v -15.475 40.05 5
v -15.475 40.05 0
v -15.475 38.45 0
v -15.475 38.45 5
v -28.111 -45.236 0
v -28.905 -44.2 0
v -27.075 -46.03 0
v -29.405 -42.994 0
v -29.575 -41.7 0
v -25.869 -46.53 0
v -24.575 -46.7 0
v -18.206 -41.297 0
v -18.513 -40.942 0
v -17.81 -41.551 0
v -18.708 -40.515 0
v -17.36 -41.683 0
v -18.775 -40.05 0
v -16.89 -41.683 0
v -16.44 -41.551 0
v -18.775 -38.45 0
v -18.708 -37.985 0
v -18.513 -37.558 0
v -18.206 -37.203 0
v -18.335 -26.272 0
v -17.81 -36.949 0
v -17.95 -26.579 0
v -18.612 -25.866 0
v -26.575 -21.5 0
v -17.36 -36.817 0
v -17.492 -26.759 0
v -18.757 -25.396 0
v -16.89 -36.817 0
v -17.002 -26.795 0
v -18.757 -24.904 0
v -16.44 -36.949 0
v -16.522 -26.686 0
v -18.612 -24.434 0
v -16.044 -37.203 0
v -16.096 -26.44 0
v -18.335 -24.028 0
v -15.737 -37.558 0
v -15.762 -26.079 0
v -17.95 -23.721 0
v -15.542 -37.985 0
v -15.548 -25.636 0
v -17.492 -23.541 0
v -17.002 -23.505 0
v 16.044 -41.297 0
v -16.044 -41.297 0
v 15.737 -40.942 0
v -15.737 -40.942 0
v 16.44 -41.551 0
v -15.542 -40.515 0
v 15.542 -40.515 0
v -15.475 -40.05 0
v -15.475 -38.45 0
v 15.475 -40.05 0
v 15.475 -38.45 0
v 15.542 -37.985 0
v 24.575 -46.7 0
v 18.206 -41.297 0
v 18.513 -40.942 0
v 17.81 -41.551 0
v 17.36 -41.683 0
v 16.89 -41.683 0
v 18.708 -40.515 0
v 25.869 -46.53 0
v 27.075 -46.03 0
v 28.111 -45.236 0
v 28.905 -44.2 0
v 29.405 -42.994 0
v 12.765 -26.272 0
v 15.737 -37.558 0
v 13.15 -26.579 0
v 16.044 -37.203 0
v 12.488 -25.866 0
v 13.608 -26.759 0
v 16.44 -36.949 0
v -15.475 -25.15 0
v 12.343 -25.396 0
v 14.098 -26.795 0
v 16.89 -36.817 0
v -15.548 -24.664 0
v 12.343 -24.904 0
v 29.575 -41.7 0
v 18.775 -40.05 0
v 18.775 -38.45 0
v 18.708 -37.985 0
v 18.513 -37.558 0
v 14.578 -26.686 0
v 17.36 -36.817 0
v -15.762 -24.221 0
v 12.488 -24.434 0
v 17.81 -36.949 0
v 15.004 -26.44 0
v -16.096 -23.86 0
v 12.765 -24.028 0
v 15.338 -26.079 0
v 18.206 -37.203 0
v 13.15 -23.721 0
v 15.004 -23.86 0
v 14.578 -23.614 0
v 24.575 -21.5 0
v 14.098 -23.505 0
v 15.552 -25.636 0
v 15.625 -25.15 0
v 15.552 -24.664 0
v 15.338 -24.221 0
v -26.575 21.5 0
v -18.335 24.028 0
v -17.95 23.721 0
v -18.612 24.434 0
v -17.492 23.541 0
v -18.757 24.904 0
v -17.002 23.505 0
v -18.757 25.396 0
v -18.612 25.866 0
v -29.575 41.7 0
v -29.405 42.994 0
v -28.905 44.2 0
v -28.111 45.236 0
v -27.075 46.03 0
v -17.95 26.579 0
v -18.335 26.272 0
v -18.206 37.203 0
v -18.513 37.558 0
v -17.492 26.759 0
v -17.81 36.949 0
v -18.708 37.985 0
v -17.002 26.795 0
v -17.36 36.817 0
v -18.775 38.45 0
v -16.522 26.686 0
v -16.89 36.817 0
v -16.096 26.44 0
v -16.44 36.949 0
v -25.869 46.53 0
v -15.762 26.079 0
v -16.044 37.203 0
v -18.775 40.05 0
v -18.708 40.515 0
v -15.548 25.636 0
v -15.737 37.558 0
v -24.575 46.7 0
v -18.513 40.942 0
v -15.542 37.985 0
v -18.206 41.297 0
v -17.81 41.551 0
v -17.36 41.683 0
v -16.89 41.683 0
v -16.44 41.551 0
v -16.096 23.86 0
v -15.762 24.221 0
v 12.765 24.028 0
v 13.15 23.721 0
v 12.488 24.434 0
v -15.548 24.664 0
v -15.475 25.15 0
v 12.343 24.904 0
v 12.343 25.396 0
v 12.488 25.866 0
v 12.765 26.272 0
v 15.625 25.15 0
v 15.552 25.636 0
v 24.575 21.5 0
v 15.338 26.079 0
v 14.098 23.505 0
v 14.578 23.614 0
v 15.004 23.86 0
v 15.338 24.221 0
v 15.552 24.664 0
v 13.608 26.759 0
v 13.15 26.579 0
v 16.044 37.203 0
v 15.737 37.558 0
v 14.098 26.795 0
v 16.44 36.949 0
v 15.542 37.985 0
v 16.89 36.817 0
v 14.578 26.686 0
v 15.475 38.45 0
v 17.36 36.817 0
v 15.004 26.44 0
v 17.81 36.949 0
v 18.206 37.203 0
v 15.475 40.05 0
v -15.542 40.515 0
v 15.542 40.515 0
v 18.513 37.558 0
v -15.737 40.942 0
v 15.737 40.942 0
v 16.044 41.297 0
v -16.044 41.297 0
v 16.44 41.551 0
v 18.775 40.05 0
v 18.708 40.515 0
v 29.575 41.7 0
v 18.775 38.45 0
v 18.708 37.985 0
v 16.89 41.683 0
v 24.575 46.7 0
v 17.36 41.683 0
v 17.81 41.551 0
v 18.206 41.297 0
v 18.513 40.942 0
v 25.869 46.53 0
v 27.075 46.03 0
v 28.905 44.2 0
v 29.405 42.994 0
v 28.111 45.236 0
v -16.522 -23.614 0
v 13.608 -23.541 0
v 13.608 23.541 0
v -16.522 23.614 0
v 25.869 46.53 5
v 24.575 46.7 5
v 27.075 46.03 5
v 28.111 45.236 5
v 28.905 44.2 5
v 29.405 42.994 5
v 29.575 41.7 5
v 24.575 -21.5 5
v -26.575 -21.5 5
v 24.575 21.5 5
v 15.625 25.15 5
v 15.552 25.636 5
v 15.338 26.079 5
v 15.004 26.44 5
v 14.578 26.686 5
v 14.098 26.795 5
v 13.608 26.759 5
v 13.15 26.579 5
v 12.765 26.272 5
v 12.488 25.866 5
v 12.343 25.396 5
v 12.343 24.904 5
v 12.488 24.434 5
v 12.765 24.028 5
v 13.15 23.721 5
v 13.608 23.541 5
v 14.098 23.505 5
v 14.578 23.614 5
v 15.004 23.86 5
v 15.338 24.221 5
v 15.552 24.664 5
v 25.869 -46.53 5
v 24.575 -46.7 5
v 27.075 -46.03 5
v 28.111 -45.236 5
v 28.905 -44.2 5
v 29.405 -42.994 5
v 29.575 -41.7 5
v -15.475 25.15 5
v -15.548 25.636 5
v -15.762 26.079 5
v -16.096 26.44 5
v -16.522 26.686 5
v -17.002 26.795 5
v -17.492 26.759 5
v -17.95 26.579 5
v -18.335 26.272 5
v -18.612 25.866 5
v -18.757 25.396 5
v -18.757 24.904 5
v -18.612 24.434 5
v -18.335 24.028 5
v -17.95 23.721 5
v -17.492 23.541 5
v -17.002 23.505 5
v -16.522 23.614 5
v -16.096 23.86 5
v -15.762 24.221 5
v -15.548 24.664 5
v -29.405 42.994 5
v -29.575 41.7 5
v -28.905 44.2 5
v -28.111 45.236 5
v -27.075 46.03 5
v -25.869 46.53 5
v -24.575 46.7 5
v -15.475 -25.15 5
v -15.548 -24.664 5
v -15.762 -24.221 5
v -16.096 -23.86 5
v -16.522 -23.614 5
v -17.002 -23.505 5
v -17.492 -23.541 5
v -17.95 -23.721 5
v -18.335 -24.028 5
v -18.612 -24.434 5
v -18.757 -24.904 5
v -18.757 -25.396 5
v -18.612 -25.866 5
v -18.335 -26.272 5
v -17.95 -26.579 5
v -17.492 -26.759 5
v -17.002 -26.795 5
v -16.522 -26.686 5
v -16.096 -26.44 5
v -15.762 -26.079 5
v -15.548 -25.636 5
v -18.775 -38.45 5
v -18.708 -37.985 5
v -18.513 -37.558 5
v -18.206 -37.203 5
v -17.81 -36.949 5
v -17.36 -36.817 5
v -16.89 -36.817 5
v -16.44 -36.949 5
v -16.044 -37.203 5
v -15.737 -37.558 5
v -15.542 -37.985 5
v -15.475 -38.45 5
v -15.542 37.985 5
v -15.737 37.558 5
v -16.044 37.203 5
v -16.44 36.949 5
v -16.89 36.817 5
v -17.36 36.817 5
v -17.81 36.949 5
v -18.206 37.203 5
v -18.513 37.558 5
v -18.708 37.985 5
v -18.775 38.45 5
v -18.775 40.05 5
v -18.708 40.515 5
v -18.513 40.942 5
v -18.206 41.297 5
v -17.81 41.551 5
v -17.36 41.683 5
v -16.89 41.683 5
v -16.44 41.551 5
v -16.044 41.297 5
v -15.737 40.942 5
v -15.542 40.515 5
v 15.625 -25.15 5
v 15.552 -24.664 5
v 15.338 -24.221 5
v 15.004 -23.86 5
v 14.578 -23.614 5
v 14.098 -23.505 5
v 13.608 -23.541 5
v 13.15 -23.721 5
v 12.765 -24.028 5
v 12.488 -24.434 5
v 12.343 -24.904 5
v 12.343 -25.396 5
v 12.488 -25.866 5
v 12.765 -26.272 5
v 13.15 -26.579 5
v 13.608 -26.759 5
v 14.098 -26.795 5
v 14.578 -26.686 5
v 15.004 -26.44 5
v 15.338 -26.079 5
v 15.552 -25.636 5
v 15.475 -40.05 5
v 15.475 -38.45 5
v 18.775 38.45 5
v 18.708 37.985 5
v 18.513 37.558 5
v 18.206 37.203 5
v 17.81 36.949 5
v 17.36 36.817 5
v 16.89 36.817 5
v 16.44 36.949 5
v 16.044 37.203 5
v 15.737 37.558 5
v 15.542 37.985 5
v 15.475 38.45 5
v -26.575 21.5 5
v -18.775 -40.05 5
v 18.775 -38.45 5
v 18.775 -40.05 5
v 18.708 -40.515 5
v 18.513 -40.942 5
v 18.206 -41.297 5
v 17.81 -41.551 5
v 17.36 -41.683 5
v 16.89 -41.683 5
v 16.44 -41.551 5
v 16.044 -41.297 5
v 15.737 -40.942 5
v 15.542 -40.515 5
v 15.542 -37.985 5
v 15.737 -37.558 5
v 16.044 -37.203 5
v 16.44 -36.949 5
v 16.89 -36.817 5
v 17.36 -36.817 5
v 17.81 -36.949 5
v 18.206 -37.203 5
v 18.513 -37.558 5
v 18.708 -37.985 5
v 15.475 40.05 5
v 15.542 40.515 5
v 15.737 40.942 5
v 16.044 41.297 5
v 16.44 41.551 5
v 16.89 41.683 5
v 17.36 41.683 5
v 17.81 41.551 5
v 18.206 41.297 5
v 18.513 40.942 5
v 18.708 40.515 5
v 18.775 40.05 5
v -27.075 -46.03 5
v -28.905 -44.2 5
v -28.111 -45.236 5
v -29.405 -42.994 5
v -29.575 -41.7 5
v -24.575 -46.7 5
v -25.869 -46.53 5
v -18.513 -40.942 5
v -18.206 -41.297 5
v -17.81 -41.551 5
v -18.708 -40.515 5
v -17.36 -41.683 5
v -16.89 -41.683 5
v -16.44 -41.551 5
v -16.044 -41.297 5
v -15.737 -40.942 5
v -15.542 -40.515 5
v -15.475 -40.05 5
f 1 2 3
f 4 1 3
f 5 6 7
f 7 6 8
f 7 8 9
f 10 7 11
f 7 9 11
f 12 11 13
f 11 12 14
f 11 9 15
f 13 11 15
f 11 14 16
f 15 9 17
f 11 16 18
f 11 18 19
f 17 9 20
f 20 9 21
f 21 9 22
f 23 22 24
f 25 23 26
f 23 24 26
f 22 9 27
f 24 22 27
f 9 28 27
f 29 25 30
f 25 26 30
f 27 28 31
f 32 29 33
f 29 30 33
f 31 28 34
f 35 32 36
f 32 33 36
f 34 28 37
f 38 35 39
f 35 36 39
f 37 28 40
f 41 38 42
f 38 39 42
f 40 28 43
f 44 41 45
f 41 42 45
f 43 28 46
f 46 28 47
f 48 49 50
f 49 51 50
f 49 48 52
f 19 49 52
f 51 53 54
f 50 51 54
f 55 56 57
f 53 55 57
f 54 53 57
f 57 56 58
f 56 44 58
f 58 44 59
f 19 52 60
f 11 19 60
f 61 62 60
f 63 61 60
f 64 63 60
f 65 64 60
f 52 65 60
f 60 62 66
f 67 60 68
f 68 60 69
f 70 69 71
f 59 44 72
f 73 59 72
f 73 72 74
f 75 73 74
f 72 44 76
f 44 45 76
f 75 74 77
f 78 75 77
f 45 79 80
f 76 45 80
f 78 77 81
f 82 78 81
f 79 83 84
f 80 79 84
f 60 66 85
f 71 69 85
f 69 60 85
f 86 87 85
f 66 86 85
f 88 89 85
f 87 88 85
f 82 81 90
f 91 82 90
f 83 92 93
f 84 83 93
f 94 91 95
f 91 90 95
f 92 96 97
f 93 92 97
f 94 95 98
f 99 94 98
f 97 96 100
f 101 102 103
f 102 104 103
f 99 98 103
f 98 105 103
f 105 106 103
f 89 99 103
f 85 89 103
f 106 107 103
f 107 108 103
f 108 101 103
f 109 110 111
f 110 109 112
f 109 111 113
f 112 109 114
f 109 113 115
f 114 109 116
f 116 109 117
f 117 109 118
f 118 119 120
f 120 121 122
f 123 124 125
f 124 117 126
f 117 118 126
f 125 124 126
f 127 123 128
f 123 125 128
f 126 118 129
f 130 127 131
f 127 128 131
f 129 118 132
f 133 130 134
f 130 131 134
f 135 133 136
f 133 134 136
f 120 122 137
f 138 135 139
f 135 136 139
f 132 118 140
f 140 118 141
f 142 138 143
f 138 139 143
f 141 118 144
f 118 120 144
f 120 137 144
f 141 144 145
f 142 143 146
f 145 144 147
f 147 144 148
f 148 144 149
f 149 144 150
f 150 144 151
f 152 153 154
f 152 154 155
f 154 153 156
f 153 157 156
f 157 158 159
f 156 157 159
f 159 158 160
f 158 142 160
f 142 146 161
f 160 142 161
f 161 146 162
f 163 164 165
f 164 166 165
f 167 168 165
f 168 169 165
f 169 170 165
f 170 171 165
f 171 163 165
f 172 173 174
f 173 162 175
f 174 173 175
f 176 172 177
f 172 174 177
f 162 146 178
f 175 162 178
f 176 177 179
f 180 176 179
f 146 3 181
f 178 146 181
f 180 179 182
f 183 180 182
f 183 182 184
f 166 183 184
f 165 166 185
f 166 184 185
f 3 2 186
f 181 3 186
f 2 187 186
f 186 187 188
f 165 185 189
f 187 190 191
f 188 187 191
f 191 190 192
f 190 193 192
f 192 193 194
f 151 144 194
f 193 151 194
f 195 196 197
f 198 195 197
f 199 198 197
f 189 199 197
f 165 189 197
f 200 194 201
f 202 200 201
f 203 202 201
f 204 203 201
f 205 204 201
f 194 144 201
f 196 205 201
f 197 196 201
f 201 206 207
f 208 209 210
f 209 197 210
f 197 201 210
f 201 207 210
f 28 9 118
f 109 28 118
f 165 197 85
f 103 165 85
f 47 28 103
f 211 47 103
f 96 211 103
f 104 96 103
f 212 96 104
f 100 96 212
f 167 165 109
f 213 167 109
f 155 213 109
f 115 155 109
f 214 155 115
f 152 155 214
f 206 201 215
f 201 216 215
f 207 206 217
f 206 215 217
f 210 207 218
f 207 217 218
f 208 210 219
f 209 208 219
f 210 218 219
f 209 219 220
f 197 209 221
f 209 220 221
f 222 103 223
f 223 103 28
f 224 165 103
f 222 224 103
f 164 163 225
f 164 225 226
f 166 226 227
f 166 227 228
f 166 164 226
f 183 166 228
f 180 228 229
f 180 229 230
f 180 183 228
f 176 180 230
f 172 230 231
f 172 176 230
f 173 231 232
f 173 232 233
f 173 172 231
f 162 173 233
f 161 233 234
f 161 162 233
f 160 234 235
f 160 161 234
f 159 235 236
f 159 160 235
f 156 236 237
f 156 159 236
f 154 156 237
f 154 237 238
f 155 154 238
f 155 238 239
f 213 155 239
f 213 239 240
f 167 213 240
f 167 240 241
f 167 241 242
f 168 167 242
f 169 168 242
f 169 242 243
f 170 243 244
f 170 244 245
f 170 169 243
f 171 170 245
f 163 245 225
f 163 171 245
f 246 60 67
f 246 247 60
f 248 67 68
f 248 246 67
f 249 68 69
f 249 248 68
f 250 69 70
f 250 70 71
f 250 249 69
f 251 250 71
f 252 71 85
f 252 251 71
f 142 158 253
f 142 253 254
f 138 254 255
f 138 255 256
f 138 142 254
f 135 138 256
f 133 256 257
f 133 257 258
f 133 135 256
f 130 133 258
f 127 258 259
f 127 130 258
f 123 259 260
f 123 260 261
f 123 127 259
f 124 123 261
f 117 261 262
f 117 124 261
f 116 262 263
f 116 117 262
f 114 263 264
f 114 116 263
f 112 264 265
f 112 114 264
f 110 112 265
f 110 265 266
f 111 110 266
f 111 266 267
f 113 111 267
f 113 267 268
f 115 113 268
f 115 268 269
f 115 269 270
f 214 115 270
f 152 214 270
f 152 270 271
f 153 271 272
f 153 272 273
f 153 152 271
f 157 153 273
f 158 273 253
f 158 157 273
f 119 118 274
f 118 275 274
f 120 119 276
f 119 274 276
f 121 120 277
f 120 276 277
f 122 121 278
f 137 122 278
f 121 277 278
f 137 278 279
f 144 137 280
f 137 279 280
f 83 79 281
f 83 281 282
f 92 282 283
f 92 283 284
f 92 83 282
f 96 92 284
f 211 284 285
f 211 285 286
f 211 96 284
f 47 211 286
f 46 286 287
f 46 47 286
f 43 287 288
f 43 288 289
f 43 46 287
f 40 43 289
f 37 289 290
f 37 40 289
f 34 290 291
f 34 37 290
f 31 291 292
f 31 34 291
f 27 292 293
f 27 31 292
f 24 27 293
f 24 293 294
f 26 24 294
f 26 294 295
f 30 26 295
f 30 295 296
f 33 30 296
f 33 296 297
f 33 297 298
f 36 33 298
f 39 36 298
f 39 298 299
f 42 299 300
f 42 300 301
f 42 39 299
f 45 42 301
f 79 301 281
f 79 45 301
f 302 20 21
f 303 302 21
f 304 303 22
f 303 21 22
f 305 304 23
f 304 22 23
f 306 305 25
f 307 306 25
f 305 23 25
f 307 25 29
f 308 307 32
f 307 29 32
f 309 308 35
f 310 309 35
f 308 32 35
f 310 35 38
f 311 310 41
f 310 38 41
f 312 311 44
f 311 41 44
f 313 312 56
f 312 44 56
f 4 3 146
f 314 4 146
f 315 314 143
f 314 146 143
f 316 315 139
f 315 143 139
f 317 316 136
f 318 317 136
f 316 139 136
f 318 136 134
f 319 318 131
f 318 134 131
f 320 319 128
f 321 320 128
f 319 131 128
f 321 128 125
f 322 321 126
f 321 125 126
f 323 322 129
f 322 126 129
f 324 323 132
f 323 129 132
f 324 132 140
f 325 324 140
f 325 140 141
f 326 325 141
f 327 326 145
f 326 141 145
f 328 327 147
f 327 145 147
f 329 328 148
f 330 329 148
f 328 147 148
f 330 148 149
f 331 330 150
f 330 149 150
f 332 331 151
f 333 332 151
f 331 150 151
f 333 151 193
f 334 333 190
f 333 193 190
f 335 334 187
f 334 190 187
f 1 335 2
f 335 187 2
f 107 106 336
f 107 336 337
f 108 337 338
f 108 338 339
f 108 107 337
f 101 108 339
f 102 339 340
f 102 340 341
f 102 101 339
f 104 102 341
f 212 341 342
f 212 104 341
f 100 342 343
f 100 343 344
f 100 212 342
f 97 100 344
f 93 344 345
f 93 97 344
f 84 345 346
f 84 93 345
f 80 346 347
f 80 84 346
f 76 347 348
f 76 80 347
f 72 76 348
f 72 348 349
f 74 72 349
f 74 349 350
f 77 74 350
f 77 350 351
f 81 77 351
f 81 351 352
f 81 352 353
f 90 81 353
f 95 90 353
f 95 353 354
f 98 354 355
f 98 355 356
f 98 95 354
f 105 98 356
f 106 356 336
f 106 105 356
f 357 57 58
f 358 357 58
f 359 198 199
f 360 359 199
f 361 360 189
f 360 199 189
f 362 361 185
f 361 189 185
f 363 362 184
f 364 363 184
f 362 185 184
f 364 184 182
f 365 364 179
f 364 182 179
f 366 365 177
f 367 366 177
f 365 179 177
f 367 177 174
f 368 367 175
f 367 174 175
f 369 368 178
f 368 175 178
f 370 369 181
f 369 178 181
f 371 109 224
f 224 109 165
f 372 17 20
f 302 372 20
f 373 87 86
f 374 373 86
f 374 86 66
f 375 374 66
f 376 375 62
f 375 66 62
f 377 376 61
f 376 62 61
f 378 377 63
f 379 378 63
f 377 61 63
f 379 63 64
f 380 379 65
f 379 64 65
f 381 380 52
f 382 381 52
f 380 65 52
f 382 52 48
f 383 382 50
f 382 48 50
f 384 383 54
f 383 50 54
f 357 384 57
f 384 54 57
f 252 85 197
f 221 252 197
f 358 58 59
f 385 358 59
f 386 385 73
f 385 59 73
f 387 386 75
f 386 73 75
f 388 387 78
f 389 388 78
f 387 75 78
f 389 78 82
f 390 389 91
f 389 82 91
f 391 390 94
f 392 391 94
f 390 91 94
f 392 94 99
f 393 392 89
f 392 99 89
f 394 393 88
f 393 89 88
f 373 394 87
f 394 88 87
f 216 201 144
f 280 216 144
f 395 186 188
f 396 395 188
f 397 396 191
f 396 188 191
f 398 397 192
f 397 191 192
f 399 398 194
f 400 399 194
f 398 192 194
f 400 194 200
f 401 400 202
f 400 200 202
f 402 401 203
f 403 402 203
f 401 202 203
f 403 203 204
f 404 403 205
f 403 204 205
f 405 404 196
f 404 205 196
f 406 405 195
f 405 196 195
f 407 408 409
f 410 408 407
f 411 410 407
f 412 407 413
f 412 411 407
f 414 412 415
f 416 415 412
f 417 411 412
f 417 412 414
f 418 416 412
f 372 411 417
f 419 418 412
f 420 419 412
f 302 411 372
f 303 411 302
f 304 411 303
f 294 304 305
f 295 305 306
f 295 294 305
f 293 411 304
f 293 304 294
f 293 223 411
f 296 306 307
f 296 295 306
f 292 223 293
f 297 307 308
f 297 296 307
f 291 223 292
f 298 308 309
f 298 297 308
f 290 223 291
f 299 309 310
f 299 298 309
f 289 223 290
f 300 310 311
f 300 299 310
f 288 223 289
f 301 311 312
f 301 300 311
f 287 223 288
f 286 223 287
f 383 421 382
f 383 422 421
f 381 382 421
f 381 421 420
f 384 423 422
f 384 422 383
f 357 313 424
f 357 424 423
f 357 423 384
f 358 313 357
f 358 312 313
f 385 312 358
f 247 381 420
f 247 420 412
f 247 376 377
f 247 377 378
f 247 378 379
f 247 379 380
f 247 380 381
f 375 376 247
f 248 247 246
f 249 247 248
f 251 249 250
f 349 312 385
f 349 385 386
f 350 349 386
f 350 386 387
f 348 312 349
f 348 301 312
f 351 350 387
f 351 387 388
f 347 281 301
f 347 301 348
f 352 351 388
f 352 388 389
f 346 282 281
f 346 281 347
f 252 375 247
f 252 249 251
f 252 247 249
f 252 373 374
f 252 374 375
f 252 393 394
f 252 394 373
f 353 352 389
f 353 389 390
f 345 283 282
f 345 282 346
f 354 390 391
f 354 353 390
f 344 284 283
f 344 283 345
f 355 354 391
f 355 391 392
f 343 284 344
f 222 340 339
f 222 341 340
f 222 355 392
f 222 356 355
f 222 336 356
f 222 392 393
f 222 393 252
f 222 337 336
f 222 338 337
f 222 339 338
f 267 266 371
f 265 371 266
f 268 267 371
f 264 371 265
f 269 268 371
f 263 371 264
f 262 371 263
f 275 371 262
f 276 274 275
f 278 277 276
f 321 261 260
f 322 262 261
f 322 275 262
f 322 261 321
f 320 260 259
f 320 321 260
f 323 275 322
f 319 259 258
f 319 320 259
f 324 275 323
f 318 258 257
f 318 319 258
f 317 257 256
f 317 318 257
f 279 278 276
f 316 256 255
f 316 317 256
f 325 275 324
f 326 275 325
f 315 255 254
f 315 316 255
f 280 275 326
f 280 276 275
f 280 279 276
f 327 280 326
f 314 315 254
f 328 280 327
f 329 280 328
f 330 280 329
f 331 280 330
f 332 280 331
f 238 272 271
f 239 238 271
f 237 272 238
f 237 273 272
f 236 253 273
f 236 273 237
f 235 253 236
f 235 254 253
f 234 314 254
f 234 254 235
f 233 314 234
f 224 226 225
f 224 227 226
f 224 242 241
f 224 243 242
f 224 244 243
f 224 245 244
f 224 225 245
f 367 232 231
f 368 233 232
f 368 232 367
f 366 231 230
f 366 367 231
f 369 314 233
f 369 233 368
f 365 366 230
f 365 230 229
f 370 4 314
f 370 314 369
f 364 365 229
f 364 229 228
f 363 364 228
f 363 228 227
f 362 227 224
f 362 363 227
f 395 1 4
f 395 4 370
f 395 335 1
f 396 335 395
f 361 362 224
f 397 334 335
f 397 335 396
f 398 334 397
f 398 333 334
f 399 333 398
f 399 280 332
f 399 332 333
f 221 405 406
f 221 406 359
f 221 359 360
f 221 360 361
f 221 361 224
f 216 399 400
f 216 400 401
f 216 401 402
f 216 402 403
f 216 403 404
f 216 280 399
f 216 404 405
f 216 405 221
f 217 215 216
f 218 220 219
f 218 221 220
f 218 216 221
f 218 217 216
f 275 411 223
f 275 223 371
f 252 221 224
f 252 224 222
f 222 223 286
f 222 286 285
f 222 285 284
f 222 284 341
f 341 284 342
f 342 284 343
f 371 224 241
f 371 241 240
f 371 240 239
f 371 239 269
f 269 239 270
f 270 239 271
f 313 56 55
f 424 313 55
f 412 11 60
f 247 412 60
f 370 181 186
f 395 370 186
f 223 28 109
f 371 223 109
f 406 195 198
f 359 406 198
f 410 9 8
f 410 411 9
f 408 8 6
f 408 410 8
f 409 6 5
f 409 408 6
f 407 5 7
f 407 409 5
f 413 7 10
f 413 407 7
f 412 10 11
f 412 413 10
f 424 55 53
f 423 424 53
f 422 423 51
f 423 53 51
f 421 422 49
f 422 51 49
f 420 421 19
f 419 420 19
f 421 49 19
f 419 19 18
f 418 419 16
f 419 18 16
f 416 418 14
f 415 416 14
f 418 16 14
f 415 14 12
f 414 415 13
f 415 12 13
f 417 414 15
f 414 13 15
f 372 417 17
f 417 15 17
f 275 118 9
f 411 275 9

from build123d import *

# Parameters (mm, degrees)
F0_W     = 49.15
F0_H     = 10.3
F0_R     = 1.65
F1_DEPTH = 5
F2_R     = 5


with BuildPart() as f1:
    # F0 (on Top) → F1 (new body)
    with BuildSketch(Plane.XY):
        Polygon((-29.575, 31.8), (-24.575, 31.8), (24.575, 31.8), (29.575, 31.8), (29.575, 46.7), (-29.575, 46.7), align=None)
        with BuildLine():
            ThreePointArc((-15.475, 38.45), (-17.125, 36.8), (-18.775, 38.45))
            Line((-18.775, 38.45), (-18.775, 40.05))
            ThreePointArc((-18.775, 40.05), (-17.125, 41.7), (-15.475, 40.05))
            Line((-15.475, 40.05), (-15.475, 38.45))
        make_face(mode=Mode.SUBTRACT)
        with BuildLine():
            ThreePointArc((18.775, 38.45), (17.125, 36.8), (15.475, 38.45))
            Line((15.475, 38.45), (15.475, 40.05))
            ThreePointArc((15.475, 40.05), (17.125, 41.7), (18.775, 40.05))
            Line((18.775, 40.05), (18.775, 38.45))
        make_face(mode=Mode.SUBTRACT)
        Polygon((29.575, 31.8), (24.575, 31.8), (24.575, 21.5), (24.575, -21.5), (24.575, -31.8), (29.575, -31.8), align=None)
        with Locations((0, 26.65)):
            Rectangle(F0_W, F0_H)
        with Locations((-17.125, 25.15)):
            Circle(F0_R, mode=Mode.SUBTRACT)
        with Locations((13.975, 25.15)):
            Circle(F0_R, mode=Mode.SUBTRACT)
        with Locations((0, -26.65)):
            Rectangle(F0_W, F0_H)
        with Locations((-17.125, -25.15)):
            Circle(F0_R, mode=Mode.SUBTRACT)
        with Locations((13.975, -25.15)):
            Circle(F0_R, mode=Mode.SUBTRACT)
        Polygon((-24.575, 21.5), (-24.575, 31.8), (-29.575, 31.8), (-29.575, -31.8), (-24.575, -31.8), (-24.575, -21.5), (-26.575, -21.5), (-26.575, 21.5), align=None)
        Polygon((-24.575, -31.8), (-29.575, -31.8), (-29.575, -46.7), (29.575, -46.7), (29.575, -31.8), (24.575, -31.8), align=None)
        with BuildLine():
            ThreePointArc((-18.775, -38.45), (-17.125, -36.8), (-15.475, -38.45))
            Line((-15.475, -38.45), (-15.475, -40.05))
            ThreePointArc((-15.475, -40.05), (-17.125, -41.7), (-18.775, -40.05))
            Line((-18.775, -40.05), (-18.775, -38.45))
        make_face(mode=Mode.SUBTRACT)
        with BuildLine():
            ThreePointArc((18.775, -40.05), (17.125, -41.7), (15.475, -40.05))
            Line((15.475, -40.05), (15.475, -38.45))
            ThreePointArc((15.475, -38.45), (17.125, -36.8), (18.775, -38.45))
            Line((18.775, -38.45), (18.775, -40.05))
        make_face(mode=Mode.SUBTRACT)
    extrude(amount=F1_DEPTH)

    # F2
    f2_edges = [f1.edges().sort_by_distance(p)[0] for p in [
        (29.575, 46.7, 2.5),
        (-29.575, 46.7, 2.5),
        (-29.575, -46.7, 2.5),
        (29.575, -46.7, 2.5),
    ]]
    fillet(f2_edges, radius=F2_R)


solid = f1.part
